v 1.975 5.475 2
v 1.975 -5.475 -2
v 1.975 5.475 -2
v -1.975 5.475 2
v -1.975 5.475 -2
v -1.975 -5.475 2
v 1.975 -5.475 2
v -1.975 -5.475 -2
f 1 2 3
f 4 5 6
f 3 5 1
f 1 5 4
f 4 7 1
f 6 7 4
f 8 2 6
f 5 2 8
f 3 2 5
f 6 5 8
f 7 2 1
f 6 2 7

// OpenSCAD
use <lib.scad>

small = [2.95, 6.95, 3];
large = [3.95, 10.95, 4];

module sideCutOutsHD(body) {
	union() {
		translate([-0.06,0,0]) rotate([0,0,30]) cyl(0.1, 0.1, z(body)-0.2, $fn=6);
		for (i = [1:y(body)*2.4])
			translate([0,0.2*i,0]) translate([-0.06,0,0]) rotate([0,0,30]) cyl(0.1, 0.1, z(body)-0.2, $fn=6);
		for (i = [1:y(body)*2.4])
			translate([0,-0.2*i,0]) translate([-0.06,0,0]) rotate([0,0,30]) cyl(0.1, 0.1, z(body)-0.2, $fn=6);
	}
}

module sideCutOutsLD(body) {
	union() {
		//translate([-0.06,0,0]) rotate([0,0,0]) cyl(0.1, 0.1, z(body)-0.2, $fn=4);
		for (i = [1:2:y(body)*2.4])
			translate([0,0.2*i,0]) translate([-0.06,0,0]) rotate([0,0,30]) cyl(0.15, 0.15, z(body)-0.4, $fn=6);
		for (i = [1:2:y(body)*2.4])
			translate([0,-0.2*i,0]) translate([-0.06,0,0]) rotate([0,0,30]) cyl(0.15, 0.15, z(body)-0.4, $fn=6);
	}
}

module sideCutOuts3HD(body) {
	rotate([0,000,0]) translate([-x(body)/2+0.02,0,0]) sideCutOutsHD(body);
	rotate([0,090,0]) translate([-x(body)/2,0,0]) sideCutOutsHD(body);
	rotate([0,180,0]) translate([-x(body)/2+0.02,0,0]) sideCutOutsHD(body);
}

module sideCutOuts3LD(body) {
	rotate([0,000,0]) translate([-x(body)/2+0.02,0,0]) sideCutOutsLD(body);
	rotate([0,090,0]) translate([-x(body)/2,0,0]) sideCutOutsLD(body);
	rotate([0,180,0]) translate([-x(body)/2+0.02,0,0]) sideCutOutsLD(body);
}

module doorFrame(body) {
	box([x(body)/2-0.15,0.05,z(body)-0.2]);
}

module doorsHD(body) {
	translate([x(body)/4-0.025,0,0]) doorFrame(body);
	for (i = [-z(body)/2+0.3:0.3:z(body)/2-0.2])
		translate([x(body)/4-0.025,0,i]) rotate([0,90,0]) cyl(0.1,0.1,x(body)/2-0.3,$fn=6);
	translate([-x(body)/4+0.025,0,0]) doorFrame(body);
	for (i = [-z(body)/2+0.3:0.3:z(body)/2-0.2])
		translate([-x(body)/4+0.025,0,i]) rotate([0,90,0]) cyl(0.1,0.1,x(body)/2-0.3,$fn=6);
}

module doors2HD(body) {
	translate([0,y(body)/2,0]) doorsHD(body);
	translate([0,-y(body)/2,0]) rotate([0,0,180]) doorsHD(body);
}

module doorsLD(body) {
	translate([x(body)/4-0.025,0,0]) doorFrame(body);
	for (i = [-z(body)/2+0.6:0.6:z(body)/2-0.4])
		translate([x(body)/4-0.025,0.05,i]) rotate([0,90,0]) cyl(0.2,0.2,x(body)/2-0.3,$fn=6);
	translate([-x(body)/4+0.025,0,0]) doorFrame(body);
	for (i = [-z(body)/2+0.6:0.6:z(body)/2-0.4])
		translate([-x(body)/4+0.025,0.05,i]) rotate([0,90,0]) cyl(0.2,0.2,x(body)/2-0.3,$fn=6);
}

module doors2LD(body) {
	translate([0,y(body)/2,0]) doorsLD(body);
	translate([0,-y(body)/2,0]) rotate([0,0,180]) doorsLD(body);
}

module hd(body) {
	difference() {
		rbox(body,0.01,$fn=8);
		sideCutOuts3HD(body);
		doors2HD(body);
	}
}

module ld(body) {
	difference() {
		box(body);
		sideCutOuts3LD(body);
		doors2LD(body);
	}
}

//ld(small);
//hd(large);
hull() ld(large);
